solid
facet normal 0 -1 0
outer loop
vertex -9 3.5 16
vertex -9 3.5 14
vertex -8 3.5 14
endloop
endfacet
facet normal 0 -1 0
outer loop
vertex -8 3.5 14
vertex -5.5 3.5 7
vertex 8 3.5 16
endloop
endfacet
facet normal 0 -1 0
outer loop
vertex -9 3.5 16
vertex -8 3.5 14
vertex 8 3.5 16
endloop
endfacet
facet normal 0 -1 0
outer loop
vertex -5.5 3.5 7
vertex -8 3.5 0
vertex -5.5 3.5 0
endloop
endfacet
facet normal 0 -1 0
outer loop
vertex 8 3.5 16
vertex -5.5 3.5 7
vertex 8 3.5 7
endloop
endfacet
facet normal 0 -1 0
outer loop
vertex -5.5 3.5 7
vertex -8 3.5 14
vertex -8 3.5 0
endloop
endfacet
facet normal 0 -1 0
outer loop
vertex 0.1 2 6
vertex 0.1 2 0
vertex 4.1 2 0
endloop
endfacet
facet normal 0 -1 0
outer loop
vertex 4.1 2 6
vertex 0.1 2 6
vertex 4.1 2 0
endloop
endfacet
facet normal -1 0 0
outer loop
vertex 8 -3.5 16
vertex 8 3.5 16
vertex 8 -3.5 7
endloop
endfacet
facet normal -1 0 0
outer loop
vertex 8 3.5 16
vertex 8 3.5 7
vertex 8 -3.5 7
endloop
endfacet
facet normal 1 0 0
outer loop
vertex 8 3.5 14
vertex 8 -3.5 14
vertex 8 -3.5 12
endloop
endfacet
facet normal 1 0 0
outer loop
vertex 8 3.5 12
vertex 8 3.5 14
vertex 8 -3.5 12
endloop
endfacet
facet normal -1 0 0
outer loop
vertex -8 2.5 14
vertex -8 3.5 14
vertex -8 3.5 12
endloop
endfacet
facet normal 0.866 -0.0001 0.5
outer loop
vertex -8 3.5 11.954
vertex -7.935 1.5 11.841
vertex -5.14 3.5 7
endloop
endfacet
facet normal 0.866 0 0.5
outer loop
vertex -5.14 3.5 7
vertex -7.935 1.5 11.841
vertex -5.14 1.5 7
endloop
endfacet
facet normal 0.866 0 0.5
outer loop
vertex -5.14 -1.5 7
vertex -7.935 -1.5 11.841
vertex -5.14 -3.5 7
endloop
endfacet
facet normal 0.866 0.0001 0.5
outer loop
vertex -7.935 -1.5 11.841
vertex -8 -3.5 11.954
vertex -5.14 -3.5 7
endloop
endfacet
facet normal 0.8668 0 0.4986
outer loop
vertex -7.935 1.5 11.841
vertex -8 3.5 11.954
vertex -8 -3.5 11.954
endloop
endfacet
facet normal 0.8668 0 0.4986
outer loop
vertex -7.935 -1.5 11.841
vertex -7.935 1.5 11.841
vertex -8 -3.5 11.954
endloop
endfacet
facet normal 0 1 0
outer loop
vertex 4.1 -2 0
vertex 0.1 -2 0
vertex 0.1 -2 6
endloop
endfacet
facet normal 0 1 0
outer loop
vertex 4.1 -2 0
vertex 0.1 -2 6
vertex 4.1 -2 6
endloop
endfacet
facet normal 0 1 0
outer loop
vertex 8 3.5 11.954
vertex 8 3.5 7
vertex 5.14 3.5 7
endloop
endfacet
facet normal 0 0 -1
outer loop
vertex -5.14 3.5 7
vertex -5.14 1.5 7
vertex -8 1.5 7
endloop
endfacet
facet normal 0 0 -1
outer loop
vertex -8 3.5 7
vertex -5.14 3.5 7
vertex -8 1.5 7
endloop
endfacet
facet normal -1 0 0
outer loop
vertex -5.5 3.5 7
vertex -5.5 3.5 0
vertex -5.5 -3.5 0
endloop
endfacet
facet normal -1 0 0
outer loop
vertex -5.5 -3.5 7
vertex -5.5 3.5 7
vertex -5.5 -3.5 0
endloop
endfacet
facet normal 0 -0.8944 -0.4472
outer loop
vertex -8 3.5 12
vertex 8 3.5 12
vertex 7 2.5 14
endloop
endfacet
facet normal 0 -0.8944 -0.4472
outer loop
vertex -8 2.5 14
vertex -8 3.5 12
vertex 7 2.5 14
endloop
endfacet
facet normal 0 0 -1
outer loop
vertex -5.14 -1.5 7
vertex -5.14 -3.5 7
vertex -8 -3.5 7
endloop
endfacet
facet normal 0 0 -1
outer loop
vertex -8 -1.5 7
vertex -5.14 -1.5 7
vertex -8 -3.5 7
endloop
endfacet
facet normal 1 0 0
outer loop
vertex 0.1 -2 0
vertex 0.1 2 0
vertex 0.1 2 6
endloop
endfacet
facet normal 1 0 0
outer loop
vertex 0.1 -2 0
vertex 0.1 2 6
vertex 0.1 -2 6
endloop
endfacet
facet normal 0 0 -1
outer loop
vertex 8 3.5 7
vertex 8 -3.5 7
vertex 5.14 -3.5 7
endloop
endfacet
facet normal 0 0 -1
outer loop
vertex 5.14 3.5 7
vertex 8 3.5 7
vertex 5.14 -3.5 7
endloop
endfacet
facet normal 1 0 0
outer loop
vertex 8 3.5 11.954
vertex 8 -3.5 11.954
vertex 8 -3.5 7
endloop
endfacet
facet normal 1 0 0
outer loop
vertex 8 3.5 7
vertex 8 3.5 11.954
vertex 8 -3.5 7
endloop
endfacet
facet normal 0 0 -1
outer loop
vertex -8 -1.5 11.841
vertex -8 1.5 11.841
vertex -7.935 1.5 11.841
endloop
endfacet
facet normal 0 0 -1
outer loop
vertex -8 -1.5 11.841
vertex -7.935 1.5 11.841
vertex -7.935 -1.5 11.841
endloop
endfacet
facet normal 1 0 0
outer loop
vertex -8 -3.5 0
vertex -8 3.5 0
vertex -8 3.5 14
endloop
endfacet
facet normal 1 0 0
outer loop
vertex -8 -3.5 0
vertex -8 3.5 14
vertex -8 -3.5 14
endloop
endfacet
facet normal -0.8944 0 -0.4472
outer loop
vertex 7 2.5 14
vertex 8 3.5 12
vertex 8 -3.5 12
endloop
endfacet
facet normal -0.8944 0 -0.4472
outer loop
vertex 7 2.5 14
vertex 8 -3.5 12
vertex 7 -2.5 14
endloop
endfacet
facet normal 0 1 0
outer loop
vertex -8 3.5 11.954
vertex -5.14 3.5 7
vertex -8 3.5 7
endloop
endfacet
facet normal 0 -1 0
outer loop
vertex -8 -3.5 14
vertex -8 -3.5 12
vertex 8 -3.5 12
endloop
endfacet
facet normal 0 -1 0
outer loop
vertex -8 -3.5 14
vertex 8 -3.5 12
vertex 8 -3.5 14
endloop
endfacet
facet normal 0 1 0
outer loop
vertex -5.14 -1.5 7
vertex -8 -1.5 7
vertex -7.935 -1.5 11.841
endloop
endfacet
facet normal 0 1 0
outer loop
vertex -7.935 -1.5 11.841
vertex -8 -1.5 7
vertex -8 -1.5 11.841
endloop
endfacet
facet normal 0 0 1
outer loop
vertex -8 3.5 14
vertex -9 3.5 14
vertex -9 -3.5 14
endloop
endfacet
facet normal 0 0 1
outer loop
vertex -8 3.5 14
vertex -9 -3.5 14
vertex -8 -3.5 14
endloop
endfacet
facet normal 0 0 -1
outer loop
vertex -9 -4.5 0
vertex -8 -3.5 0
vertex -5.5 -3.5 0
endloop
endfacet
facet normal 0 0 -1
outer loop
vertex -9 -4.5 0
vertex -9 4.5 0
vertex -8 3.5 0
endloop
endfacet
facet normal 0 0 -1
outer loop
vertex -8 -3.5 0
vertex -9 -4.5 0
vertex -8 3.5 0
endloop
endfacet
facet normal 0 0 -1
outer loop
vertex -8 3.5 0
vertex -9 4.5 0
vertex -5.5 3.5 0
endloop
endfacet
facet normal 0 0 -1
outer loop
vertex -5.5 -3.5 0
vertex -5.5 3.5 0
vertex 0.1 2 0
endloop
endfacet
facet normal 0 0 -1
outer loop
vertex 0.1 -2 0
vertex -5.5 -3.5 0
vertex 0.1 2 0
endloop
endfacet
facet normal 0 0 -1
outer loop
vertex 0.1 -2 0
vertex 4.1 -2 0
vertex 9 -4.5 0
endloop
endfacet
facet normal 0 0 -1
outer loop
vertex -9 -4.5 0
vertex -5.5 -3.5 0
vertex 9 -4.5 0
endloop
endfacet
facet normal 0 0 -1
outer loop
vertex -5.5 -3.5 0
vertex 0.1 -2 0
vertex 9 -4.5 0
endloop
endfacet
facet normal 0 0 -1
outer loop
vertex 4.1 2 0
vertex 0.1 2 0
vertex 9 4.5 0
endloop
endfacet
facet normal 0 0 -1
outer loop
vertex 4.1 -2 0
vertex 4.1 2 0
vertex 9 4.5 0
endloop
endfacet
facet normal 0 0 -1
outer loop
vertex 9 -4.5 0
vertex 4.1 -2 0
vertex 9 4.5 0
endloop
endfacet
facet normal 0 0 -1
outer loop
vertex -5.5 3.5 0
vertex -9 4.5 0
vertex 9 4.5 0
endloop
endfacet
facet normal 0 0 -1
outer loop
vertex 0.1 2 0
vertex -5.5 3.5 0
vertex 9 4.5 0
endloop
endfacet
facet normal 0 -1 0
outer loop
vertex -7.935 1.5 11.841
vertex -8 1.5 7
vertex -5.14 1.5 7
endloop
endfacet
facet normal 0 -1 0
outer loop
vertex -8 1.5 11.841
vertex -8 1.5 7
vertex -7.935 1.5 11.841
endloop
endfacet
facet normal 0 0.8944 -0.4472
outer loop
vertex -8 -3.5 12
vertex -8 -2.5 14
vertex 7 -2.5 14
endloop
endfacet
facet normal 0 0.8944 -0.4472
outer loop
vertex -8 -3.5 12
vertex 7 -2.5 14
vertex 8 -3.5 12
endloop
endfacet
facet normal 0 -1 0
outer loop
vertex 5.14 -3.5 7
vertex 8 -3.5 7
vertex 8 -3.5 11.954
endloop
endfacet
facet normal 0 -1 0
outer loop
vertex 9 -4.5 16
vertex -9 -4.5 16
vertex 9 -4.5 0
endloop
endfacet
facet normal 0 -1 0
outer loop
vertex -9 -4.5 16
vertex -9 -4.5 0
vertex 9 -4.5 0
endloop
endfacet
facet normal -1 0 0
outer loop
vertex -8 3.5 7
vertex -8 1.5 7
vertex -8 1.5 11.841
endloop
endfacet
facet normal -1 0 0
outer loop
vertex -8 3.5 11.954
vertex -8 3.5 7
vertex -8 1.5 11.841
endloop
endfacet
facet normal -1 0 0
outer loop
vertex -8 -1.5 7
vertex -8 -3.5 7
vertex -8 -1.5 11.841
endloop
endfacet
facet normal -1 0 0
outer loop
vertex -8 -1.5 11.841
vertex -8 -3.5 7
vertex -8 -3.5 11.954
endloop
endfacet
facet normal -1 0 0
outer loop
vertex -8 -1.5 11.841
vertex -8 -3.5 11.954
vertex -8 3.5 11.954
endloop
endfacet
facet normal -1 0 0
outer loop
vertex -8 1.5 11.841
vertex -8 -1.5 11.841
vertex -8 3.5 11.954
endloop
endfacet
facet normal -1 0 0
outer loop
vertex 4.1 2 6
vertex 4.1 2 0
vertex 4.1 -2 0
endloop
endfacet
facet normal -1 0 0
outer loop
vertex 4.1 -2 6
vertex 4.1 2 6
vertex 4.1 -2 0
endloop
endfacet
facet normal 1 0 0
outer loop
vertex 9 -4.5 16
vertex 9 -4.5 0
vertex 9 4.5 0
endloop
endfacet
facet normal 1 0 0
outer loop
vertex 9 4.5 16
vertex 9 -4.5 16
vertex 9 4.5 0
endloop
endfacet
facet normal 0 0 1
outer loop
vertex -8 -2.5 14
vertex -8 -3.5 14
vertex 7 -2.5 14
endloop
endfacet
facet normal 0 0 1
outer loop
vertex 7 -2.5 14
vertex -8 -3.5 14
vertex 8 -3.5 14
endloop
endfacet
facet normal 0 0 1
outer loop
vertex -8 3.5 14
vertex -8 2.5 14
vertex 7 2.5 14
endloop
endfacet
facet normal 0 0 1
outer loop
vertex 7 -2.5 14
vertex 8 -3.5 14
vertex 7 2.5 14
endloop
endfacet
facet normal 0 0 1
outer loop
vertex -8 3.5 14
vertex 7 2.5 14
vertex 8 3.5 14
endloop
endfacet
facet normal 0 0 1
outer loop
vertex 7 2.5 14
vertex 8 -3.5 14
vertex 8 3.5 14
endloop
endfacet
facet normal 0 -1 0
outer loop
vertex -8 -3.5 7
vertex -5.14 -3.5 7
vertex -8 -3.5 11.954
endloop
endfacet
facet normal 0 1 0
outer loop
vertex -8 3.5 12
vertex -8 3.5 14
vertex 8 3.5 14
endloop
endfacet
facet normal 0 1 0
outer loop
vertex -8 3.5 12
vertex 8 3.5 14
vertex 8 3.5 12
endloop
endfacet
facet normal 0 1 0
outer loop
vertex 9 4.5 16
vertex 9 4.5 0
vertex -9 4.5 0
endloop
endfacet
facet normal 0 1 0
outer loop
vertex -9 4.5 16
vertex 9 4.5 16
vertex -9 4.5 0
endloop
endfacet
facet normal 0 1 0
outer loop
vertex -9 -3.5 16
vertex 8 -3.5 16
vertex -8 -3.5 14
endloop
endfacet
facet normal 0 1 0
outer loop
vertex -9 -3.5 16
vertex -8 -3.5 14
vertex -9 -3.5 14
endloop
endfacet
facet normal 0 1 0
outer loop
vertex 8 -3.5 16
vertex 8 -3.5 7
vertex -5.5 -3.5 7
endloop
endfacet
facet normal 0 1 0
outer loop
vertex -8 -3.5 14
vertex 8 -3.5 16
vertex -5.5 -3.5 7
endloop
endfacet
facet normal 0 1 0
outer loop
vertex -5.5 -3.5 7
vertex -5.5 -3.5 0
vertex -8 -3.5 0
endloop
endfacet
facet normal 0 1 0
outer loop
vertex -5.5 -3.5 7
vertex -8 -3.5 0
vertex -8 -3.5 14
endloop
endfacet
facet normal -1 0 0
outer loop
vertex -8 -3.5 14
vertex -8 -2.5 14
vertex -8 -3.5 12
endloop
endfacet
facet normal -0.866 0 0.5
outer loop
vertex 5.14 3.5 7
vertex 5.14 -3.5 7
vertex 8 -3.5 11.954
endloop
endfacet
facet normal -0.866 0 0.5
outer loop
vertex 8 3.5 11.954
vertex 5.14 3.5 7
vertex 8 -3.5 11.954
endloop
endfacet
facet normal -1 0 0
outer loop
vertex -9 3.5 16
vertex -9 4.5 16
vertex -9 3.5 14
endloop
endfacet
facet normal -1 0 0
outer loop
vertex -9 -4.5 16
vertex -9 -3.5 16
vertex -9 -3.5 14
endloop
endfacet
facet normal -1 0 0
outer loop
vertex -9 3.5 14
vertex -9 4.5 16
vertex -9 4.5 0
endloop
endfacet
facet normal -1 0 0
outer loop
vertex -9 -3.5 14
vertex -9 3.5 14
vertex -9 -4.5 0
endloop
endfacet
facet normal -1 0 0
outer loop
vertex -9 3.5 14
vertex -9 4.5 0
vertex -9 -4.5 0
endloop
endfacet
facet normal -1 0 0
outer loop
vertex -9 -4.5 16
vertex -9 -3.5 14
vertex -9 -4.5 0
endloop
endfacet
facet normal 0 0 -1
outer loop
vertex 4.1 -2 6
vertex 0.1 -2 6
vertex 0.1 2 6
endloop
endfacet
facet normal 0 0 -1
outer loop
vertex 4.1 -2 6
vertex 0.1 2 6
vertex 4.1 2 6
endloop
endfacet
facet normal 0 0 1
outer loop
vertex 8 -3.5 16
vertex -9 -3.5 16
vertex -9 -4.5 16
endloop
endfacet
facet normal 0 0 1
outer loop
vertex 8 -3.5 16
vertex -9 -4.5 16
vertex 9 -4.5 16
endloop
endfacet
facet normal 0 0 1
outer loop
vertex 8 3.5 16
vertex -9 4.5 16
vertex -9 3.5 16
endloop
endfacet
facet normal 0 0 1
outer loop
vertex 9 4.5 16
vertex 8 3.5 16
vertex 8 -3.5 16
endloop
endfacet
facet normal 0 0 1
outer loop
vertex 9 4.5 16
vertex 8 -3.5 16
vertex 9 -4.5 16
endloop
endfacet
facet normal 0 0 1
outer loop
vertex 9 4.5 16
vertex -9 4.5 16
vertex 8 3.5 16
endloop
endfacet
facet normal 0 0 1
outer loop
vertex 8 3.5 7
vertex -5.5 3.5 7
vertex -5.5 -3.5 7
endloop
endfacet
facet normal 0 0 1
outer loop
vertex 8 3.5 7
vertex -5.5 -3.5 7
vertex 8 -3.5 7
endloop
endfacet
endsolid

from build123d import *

# Parameters (mm, degrees)
F0_W      = 18
F0_H      = 9
F1_DEPTH  = 14
F2_W      = 16
F2_H      = 7
F3_DEPTH  = 7
F4_W      = 4
F4_H      = 4
F5_DEPTH  = 6
F4_W_2    = 2.5
F4_H_2    = 7
F6_DEPTH  = 9
F8_DEPTH  = 2
F10_DEPTH = 7
F12_DEPTH = 16
F13_W     = 3
F13_H     = 5.4984997745
F14_DEPTH = 10


with BuildPart() as f1:
    # F0 (on Top) → F1 (new body)
    with BuildSketch(Plane.XY):
        Rectangle(F0_W, F0_H)
    extrude(amount=F1_DEPTH)

    # F2 (on face) → F3 (cut)
    with BuildSketch(Plane.XY.offset(14)):
        Rectangle(F2_W, F2_H)
    extrude(amount=-F3_DEPTH, mode=Mode.SUBTRACT)

    # F4 (on face) → F5 (cut)
    with BuildSketch(Plane(origin=(0, 0, 0), x_dir=(1, 0, 0), z_dir=(0, 0, -1))):
        with Locations((2.1, 0)):
            Rectangle(F4_W, F4_H)
    extrude(amount=-F5_DEPTH, mode=Mode.SUBTRACT)

    # F4 (on face) → F6 (cut)
    with BuildSketch(Plane(origin=(0, 0, 0), x_dir=(1, 0, 0), z_dir=(0, 0, -1))):
        with Locations((-6.75, 0)):
            Rectangle(F4_W_2, F4_H_2)
    extrude(amount=-F6_DEPTH, mode=Mode.SUBTRACT)

    # F7 (on face) → F8 (join)
    with BuildSketch(Plane.XY.offset(14)):
        Polygon((9, 4.5), (-9, 4.5), (-9, 3.5), (8, 3.5), (8, -3.5), (-9, -3.5), (-9, -4.5), (9, -4.5), align=None)
    extrude(amount=F8_DEPTH)


with BuildPart() as f10:
    # F9 (on face) → F10 (new body)
    with BuildSketch(Plane(origin=(0, -3.5, 0), x_dir=(-1, 0, 0), z_dir=(0, 1, 0))):
        Polygon((-7, 14), (-8, 14), (-8, 12), align=None)
    extrude(amount=F10_DEPTH)

    # F11 (on face) → F12 (join)
    with BuildSketch(Plane(origin=(8, 0, 0), x_dir=(0, -1, 0), z_dir=(-1, 0, 0))):
        Polygon((3.5, 12), (3.5, 14), (2.5, 14), align=None)
        Polygon((-3.5, 12), (-2.5, 14), (-3.5, 14), align=None)
    extrude(amount=F12_DEPTH)


with BuildPart() as f10b:
    # F9 (on face) → F10, piece 2 (new body)
    with BuildSketch(Plane(origin=(0, -3.5, 0), x_dir=(-1, 0, 0), z_dir=(0, 1, 0))):
        Polygon((-8, 11.9536653096), (-8, 7), (-5.14, 7), align=None)
    extrude(amount=F10_DEPTH)


with BuildPart() as f10c:
    # F9 (on face) → F10, piece 3 (new body)
    with BuildSketch(Plane(origin=(0, -3.5, 0), x_dir=(-1, 0, 0), z_dir=(0, 1, 0))):
        Polygon((8, 7), (8, 11.9536653096), (5.14, 7), align=None)
    extrude(amount=F10_DEPTH)

    # F13 (on face) → F14 (cut)
    with BuildSketch(Plane(origin=(-9, 0, 0), x_dir=(0, -1, 0), z_dir=(-1, 0, 0))):
        with Locations((0, 9.0919707436)):
            Rectangle(F13_W, F13_H)
    extrude(amount=-F14_DEPTH, mode=Mode.SUBTRACT)


solid = Compound([f1.part, f10.part, f10b.part, f10c.part])
